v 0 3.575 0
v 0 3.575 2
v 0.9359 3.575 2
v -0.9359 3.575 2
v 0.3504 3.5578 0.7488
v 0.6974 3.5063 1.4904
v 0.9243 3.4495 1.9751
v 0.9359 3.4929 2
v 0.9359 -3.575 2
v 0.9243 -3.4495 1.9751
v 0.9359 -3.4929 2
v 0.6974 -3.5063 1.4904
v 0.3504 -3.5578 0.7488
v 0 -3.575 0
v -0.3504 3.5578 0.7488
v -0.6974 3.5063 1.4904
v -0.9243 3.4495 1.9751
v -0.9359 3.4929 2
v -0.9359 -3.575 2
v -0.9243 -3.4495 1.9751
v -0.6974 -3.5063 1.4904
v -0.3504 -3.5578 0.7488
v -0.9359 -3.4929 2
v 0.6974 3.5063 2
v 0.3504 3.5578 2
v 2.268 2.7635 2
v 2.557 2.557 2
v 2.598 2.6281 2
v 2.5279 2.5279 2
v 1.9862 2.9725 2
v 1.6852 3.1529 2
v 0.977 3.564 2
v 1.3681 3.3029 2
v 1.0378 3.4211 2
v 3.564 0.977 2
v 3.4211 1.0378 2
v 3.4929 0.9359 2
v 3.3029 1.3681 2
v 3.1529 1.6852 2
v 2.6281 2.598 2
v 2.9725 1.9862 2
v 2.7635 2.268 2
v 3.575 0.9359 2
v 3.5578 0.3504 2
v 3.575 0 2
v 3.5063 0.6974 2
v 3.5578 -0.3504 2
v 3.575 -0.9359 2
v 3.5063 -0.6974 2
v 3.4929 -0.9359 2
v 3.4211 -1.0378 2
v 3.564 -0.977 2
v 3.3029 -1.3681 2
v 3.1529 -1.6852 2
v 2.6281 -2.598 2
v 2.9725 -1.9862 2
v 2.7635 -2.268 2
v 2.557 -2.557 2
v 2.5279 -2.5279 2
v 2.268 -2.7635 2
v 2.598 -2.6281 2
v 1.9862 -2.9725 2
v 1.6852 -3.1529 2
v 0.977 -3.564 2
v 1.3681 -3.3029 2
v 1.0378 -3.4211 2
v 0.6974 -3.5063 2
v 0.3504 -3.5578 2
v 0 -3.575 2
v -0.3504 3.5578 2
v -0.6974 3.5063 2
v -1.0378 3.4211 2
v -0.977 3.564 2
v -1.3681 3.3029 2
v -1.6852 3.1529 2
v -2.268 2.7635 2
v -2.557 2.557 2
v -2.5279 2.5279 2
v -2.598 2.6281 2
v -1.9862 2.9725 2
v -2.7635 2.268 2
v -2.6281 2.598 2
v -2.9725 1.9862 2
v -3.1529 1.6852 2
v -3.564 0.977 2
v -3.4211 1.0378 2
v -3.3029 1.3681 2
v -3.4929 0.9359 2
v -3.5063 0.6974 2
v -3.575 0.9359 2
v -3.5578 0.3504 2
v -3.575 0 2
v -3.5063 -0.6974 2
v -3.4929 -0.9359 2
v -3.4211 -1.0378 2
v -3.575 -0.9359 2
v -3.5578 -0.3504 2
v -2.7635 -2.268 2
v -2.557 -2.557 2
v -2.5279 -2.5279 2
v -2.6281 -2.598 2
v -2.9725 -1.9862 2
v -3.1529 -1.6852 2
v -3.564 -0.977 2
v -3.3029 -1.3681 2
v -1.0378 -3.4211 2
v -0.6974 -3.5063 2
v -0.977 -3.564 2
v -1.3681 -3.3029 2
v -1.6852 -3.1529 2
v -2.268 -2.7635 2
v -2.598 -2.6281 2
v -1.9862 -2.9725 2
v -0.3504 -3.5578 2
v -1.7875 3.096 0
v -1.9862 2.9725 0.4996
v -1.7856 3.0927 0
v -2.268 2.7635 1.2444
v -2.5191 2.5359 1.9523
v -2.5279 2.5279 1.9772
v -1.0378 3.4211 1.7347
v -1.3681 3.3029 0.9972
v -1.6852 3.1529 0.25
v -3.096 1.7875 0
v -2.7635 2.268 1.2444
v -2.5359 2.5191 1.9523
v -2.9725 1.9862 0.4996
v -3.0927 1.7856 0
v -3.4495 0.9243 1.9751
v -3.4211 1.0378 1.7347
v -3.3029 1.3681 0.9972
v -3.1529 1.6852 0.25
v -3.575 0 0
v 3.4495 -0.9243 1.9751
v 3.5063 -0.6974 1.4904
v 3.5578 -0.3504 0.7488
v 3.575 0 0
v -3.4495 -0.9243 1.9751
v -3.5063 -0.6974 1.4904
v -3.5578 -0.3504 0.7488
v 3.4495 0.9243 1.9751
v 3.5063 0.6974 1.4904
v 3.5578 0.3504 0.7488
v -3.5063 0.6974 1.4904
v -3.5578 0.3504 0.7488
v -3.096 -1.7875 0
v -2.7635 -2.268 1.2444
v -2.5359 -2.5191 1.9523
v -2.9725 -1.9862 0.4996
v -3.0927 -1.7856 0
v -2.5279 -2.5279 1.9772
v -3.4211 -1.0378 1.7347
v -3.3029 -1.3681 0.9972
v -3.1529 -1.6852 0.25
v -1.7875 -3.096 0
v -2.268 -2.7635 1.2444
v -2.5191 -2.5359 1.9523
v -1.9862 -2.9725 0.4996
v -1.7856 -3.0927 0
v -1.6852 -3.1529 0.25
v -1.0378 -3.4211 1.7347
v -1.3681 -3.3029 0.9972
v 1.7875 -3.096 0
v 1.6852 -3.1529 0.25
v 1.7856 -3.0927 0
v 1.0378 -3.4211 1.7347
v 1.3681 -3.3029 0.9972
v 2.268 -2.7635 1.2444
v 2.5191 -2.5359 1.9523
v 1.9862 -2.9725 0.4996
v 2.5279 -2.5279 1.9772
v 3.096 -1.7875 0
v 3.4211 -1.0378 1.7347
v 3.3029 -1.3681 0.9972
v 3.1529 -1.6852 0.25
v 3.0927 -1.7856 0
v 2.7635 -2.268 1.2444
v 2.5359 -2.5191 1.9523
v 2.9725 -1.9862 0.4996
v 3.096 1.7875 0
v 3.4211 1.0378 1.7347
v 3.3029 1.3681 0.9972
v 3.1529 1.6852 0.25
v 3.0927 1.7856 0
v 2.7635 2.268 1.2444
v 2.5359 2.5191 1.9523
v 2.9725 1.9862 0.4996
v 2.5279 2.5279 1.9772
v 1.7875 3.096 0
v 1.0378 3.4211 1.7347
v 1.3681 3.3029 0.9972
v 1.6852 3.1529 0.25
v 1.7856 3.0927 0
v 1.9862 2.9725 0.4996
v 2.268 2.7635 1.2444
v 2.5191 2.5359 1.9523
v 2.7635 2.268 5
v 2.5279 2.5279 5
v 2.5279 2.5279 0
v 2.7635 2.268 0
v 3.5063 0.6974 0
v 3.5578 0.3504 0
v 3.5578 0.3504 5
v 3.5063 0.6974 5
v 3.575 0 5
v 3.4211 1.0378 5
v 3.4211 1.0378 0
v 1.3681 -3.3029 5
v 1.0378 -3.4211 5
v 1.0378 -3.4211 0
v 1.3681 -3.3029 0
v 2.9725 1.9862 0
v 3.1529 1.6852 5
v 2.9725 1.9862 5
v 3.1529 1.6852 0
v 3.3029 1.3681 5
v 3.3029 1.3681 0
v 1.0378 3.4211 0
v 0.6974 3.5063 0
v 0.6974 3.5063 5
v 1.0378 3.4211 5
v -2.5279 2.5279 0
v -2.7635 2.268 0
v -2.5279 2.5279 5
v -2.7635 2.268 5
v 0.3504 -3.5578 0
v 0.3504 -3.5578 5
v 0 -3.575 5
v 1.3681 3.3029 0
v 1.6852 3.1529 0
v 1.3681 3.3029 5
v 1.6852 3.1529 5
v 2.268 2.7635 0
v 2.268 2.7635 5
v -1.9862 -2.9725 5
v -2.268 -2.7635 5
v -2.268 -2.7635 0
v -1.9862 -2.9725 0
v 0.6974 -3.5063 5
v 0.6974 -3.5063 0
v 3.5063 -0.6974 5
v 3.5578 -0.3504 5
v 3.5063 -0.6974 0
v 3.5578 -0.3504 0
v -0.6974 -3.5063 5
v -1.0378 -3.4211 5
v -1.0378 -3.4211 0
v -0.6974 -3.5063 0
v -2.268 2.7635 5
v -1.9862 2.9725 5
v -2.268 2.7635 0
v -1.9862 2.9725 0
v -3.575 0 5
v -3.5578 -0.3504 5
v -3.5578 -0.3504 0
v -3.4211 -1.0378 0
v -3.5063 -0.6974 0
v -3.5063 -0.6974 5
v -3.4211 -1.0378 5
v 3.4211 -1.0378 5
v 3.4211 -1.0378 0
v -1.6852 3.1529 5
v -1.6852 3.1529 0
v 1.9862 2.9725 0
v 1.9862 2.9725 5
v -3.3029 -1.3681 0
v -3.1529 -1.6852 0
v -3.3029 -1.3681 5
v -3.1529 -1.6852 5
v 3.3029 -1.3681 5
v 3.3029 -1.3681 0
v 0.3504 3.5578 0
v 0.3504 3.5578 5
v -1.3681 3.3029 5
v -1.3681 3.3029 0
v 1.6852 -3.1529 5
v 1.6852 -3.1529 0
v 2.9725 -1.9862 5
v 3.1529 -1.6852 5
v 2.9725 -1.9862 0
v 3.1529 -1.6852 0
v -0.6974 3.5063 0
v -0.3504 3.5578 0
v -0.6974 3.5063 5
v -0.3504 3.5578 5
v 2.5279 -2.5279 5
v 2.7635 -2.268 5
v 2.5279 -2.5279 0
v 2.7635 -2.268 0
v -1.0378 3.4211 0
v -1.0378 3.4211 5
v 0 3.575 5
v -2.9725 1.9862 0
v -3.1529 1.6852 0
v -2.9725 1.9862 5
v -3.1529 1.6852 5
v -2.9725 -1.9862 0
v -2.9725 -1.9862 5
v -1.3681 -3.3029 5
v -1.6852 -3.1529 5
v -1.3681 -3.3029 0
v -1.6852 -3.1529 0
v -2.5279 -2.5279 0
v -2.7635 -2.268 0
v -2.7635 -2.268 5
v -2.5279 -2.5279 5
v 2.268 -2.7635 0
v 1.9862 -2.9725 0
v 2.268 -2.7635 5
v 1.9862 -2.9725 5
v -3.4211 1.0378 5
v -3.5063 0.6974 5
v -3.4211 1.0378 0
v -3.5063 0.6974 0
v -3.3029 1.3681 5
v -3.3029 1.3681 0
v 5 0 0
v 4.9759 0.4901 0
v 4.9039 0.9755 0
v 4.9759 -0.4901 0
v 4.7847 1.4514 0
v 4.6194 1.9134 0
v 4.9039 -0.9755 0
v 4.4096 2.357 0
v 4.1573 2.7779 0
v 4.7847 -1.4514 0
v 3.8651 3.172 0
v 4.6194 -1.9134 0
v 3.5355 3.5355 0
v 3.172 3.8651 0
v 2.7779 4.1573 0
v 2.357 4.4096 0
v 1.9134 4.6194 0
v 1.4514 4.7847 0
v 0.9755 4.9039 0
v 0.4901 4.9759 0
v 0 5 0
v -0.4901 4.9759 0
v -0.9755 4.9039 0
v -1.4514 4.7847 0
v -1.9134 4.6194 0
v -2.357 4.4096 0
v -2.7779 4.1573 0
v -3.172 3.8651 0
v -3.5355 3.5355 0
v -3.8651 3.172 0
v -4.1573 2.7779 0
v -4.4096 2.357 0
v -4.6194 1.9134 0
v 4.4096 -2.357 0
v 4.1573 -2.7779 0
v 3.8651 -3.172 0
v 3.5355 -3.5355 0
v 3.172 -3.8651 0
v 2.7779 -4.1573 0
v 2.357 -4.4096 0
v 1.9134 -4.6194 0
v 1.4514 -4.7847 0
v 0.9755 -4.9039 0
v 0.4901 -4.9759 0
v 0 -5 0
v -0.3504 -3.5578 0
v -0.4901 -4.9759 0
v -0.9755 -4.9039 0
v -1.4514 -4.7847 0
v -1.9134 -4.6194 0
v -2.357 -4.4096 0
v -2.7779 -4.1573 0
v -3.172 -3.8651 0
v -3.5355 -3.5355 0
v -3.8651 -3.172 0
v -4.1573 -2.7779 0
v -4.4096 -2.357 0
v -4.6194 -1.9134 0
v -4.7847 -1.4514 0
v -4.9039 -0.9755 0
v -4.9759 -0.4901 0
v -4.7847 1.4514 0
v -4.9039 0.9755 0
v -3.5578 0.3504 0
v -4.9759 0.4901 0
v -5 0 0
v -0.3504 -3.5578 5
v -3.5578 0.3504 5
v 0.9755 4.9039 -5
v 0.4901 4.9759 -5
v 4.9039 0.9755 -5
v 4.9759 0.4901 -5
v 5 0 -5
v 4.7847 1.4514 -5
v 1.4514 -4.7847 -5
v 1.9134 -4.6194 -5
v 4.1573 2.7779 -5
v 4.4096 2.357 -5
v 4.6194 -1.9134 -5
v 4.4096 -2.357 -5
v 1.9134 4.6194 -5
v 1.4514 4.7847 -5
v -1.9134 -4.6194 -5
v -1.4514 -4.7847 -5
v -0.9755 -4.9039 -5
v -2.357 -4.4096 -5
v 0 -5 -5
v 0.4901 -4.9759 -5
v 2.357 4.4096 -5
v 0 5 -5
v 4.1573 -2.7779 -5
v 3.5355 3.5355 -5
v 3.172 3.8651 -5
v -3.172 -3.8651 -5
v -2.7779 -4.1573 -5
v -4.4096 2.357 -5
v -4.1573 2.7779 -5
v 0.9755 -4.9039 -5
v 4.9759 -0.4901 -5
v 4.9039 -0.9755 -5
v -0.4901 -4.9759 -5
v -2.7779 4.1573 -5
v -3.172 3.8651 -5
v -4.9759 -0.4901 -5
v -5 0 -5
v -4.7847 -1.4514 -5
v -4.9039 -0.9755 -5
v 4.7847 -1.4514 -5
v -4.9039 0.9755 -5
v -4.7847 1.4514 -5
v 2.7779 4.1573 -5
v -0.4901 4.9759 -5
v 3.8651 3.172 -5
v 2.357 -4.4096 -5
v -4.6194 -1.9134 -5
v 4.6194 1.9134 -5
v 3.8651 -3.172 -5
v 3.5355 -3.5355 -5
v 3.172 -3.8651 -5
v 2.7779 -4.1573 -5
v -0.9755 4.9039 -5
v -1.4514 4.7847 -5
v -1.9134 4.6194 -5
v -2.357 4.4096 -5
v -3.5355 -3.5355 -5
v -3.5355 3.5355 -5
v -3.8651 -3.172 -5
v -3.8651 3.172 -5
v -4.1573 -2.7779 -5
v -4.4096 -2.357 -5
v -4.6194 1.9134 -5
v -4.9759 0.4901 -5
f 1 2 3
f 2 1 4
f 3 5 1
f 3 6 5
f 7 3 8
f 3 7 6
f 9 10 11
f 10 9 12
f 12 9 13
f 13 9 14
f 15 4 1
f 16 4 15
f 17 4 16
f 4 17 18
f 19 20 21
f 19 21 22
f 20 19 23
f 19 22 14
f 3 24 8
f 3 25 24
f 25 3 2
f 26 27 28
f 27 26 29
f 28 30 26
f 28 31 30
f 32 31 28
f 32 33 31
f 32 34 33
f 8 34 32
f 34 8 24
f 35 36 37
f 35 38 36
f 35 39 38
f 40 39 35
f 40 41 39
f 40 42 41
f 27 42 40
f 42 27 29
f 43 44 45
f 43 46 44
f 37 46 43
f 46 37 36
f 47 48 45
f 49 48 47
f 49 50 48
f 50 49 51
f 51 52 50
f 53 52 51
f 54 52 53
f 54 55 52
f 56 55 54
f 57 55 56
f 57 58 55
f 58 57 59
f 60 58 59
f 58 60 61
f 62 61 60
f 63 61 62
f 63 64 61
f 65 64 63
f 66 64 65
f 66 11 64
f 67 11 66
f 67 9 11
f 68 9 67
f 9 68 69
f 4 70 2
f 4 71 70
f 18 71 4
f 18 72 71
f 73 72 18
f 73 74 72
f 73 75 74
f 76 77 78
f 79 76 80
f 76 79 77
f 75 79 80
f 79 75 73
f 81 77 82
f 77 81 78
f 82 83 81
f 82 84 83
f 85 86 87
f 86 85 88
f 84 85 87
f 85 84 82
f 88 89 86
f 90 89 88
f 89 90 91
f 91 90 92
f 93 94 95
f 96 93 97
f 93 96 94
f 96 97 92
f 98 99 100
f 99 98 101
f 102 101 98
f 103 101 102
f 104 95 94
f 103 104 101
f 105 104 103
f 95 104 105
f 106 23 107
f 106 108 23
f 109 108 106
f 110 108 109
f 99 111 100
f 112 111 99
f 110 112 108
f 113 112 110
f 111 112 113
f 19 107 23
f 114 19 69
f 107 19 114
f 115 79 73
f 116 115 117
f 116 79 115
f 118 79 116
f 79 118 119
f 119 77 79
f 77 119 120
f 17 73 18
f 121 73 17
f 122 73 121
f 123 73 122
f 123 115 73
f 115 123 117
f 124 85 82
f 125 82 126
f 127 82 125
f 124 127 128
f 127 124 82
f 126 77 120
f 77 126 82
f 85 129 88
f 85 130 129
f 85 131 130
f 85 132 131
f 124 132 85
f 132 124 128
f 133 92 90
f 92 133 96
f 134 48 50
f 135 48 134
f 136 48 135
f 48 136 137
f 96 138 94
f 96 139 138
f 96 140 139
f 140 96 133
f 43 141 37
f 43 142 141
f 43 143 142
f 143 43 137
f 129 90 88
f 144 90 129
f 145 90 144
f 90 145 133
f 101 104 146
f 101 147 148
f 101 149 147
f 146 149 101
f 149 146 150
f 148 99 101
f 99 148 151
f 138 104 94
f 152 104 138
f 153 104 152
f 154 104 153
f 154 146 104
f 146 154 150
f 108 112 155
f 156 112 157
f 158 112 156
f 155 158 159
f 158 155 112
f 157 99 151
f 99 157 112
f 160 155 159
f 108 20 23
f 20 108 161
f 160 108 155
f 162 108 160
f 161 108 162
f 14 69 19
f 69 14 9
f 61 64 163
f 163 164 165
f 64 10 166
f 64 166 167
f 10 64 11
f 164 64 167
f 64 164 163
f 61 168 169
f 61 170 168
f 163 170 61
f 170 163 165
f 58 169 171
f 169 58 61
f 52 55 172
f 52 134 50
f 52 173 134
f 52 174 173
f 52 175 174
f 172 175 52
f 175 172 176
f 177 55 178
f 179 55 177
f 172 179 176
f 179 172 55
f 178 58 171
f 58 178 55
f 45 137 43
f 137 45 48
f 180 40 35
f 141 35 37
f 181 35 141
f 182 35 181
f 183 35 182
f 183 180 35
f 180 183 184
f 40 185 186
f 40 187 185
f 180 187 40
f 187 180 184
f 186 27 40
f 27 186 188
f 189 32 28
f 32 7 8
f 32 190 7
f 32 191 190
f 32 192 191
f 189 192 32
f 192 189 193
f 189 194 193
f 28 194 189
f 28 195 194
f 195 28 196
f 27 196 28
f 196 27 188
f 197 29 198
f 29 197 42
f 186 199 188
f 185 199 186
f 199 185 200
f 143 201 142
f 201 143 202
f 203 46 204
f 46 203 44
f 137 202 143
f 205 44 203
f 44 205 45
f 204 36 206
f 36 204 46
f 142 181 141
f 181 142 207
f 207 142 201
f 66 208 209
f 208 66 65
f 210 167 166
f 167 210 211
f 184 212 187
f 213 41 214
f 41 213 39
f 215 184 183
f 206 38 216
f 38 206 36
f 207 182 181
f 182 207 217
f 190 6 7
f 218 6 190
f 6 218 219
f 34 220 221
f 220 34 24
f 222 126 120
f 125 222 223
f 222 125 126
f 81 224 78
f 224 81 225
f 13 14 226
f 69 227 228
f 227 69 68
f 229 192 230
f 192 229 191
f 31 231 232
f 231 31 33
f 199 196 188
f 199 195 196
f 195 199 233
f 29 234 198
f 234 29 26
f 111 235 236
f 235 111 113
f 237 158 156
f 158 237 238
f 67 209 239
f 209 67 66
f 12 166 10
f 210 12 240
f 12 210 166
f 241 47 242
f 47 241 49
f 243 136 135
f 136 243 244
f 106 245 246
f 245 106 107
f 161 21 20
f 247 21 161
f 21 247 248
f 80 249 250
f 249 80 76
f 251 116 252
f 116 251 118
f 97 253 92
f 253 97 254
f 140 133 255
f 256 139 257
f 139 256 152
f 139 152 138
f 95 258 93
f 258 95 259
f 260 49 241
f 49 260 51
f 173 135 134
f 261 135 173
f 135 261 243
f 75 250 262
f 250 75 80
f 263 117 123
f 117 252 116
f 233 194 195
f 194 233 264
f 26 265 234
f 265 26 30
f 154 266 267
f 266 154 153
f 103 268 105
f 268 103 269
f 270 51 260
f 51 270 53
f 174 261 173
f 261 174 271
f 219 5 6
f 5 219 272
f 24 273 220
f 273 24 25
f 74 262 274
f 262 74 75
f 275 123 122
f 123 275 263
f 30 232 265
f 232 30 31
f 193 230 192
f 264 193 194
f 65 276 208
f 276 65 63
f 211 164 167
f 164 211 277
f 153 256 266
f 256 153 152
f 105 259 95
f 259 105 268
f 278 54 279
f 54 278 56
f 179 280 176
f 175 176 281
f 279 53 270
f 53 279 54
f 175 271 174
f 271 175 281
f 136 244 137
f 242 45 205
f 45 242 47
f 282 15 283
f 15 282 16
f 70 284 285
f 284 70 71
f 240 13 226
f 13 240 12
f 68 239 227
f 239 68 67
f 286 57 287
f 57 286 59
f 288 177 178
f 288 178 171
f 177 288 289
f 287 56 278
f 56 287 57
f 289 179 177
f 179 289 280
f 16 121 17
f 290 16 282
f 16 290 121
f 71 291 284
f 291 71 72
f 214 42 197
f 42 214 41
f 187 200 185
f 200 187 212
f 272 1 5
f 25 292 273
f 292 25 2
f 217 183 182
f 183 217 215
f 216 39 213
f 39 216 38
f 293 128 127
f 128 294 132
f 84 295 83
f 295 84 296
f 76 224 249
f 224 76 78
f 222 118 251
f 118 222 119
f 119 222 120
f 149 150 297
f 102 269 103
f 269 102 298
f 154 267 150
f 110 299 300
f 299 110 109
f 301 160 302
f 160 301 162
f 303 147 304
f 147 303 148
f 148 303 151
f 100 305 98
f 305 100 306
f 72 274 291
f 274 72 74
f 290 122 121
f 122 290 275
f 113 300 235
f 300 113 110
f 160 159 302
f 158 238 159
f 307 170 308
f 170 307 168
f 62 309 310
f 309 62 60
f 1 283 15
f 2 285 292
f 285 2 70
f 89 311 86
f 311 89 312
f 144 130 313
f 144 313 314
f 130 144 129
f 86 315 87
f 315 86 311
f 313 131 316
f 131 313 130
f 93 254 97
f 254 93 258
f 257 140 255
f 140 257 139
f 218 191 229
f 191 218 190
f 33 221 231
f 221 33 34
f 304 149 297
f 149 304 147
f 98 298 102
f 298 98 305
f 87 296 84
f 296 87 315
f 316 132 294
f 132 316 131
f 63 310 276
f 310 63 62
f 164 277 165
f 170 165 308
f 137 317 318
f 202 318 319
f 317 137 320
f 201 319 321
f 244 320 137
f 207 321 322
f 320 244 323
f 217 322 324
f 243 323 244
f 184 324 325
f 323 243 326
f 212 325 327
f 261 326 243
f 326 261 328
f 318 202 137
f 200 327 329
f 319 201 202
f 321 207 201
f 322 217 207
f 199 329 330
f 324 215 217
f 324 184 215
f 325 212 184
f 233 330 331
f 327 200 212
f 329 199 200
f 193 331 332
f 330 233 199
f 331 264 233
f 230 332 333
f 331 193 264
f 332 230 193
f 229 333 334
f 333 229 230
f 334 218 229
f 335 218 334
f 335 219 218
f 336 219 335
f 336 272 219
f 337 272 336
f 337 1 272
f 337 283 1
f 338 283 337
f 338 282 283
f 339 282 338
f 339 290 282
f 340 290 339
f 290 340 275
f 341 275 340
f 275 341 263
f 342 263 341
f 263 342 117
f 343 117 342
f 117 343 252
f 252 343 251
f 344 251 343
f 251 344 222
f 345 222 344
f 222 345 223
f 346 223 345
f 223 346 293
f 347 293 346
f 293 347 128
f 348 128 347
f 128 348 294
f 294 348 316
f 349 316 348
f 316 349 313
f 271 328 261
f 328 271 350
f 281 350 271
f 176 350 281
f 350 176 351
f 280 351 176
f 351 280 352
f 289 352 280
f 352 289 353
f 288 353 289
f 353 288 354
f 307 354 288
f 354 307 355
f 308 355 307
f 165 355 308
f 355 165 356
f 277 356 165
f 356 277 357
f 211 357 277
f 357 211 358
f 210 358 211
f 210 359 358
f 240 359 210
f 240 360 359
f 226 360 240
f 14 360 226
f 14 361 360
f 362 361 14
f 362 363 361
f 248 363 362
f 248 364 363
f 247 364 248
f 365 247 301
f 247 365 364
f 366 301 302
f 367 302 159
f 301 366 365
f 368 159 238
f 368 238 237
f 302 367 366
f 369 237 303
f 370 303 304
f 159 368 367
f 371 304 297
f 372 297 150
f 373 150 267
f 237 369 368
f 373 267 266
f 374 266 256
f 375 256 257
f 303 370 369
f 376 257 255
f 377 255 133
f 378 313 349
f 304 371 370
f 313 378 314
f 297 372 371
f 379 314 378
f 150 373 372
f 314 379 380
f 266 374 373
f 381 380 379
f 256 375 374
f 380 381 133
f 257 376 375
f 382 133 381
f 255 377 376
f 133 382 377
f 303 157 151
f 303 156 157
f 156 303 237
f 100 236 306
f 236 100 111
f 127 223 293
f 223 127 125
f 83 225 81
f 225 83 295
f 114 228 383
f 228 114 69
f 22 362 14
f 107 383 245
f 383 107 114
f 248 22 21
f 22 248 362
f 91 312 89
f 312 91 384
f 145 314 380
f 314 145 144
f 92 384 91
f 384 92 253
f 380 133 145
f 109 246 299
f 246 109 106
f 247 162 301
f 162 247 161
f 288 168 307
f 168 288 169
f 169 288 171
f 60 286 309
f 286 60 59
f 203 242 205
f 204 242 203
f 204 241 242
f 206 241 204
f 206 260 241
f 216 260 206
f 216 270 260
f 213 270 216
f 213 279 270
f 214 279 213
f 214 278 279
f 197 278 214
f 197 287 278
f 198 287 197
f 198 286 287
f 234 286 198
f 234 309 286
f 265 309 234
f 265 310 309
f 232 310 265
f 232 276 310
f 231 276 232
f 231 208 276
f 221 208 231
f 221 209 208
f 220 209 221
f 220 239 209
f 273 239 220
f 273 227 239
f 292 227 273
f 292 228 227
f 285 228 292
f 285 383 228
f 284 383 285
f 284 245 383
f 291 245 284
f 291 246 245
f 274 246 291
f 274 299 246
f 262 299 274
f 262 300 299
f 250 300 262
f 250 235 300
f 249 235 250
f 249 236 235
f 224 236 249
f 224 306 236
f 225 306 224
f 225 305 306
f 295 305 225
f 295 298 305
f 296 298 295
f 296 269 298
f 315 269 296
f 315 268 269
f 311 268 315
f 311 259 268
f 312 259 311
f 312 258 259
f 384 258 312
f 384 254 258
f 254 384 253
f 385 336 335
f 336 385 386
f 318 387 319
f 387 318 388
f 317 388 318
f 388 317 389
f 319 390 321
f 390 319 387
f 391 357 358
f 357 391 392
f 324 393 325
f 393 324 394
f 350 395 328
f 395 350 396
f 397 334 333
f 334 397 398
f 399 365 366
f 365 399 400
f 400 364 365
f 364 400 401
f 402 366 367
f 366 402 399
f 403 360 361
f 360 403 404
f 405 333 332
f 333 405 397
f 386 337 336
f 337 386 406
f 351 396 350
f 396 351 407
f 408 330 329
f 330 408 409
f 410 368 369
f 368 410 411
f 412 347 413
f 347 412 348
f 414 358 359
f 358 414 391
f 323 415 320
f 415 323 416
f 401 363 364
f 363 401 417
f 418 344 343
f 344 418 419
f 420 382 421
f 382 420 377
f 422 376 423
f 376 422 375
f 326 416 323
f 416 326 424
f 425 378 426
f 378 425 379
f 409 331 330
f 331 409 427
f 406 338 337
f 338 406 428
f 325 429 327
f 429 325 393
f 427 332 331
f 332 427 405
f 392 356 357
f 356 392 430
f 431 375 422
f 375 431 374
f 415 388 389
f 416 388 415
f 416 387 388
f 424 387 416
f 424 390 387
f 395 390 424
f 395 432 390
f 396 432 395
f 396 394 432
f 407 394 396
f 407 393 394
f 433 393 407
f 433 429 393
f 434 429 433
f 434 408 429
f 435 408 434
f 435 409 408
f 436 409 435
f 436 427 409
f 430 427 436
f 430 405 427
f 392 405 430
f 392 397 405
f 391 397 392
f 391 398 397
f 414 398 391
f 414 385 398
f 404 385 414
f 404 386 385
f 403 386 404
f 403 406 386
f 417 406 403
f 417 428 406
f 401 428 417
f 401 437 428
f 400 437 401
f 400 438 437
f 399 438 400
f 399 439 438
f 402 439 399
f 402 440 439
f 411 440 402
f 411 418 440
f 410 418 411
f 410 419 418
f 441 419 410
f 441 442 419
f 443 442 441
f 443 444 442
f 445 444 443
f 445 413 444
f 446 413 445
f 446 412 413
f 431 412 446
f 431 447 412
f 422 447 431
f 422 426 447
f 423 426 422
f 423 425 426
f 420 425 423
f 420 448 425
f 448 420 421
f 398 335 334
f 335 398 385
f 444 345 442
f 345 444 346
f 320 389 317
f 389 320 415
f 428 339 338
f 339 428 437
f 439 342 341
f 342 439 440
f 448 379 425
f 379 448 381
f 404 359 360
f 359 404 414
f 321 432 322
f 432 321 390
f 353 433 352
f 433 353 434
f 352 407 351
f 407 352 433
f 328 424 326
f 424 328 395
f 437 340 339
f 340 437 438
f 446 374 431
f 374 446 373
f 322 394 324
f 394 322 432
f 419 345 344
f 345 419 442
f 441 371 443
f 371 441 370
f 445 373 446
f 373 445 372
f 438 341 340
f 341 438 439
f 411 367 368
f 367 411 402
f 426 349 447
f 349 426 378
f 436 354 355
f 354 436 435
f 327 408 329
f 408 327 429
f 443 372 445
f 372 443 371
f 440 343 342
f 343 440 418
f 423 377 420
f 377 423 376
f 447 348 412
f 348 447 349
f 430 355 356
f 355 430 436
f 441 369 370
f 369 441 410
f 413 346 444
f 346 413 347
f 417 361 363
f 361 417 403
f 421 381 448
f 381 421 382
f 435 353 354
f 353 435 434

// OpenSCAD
module timing_pulley(teeth=12, pitch_diameter=7.15, belt_width=5, hub_diameter=10, hub_height=5) {
    tooth_height = 2;
    tooth_width = pitch_diameter * PI / teeth;
    pulley_height = belt_width + hub_height;
    
    module tooth() {
        translate([0, pitch_diameter / 2, 0])
        rotate([90, 0, 0])
        linear_extrude(height=belt_width)
        polygon(points=[[0, 0], [tooth_width / 2, tooth_height], [-tooth_width / 2, tooth_height]]);
    }
    
    union() {
        // Create the main pulley body
        cylinder(d=pitch_diameter, h=belt_width, $fn=64);
        
        // Add teeth around the pulley
        for (i = [0:teeth-1]) {
            rotate([0, 0, i * 360 / teeth])
            tooth();
        }
        
        // Add the hub
        translate([0, 0, -hub_height])
        cylinder(d=hub_diameter, h=hub_height, $fn=64);
    }
}

timing_pulley();
